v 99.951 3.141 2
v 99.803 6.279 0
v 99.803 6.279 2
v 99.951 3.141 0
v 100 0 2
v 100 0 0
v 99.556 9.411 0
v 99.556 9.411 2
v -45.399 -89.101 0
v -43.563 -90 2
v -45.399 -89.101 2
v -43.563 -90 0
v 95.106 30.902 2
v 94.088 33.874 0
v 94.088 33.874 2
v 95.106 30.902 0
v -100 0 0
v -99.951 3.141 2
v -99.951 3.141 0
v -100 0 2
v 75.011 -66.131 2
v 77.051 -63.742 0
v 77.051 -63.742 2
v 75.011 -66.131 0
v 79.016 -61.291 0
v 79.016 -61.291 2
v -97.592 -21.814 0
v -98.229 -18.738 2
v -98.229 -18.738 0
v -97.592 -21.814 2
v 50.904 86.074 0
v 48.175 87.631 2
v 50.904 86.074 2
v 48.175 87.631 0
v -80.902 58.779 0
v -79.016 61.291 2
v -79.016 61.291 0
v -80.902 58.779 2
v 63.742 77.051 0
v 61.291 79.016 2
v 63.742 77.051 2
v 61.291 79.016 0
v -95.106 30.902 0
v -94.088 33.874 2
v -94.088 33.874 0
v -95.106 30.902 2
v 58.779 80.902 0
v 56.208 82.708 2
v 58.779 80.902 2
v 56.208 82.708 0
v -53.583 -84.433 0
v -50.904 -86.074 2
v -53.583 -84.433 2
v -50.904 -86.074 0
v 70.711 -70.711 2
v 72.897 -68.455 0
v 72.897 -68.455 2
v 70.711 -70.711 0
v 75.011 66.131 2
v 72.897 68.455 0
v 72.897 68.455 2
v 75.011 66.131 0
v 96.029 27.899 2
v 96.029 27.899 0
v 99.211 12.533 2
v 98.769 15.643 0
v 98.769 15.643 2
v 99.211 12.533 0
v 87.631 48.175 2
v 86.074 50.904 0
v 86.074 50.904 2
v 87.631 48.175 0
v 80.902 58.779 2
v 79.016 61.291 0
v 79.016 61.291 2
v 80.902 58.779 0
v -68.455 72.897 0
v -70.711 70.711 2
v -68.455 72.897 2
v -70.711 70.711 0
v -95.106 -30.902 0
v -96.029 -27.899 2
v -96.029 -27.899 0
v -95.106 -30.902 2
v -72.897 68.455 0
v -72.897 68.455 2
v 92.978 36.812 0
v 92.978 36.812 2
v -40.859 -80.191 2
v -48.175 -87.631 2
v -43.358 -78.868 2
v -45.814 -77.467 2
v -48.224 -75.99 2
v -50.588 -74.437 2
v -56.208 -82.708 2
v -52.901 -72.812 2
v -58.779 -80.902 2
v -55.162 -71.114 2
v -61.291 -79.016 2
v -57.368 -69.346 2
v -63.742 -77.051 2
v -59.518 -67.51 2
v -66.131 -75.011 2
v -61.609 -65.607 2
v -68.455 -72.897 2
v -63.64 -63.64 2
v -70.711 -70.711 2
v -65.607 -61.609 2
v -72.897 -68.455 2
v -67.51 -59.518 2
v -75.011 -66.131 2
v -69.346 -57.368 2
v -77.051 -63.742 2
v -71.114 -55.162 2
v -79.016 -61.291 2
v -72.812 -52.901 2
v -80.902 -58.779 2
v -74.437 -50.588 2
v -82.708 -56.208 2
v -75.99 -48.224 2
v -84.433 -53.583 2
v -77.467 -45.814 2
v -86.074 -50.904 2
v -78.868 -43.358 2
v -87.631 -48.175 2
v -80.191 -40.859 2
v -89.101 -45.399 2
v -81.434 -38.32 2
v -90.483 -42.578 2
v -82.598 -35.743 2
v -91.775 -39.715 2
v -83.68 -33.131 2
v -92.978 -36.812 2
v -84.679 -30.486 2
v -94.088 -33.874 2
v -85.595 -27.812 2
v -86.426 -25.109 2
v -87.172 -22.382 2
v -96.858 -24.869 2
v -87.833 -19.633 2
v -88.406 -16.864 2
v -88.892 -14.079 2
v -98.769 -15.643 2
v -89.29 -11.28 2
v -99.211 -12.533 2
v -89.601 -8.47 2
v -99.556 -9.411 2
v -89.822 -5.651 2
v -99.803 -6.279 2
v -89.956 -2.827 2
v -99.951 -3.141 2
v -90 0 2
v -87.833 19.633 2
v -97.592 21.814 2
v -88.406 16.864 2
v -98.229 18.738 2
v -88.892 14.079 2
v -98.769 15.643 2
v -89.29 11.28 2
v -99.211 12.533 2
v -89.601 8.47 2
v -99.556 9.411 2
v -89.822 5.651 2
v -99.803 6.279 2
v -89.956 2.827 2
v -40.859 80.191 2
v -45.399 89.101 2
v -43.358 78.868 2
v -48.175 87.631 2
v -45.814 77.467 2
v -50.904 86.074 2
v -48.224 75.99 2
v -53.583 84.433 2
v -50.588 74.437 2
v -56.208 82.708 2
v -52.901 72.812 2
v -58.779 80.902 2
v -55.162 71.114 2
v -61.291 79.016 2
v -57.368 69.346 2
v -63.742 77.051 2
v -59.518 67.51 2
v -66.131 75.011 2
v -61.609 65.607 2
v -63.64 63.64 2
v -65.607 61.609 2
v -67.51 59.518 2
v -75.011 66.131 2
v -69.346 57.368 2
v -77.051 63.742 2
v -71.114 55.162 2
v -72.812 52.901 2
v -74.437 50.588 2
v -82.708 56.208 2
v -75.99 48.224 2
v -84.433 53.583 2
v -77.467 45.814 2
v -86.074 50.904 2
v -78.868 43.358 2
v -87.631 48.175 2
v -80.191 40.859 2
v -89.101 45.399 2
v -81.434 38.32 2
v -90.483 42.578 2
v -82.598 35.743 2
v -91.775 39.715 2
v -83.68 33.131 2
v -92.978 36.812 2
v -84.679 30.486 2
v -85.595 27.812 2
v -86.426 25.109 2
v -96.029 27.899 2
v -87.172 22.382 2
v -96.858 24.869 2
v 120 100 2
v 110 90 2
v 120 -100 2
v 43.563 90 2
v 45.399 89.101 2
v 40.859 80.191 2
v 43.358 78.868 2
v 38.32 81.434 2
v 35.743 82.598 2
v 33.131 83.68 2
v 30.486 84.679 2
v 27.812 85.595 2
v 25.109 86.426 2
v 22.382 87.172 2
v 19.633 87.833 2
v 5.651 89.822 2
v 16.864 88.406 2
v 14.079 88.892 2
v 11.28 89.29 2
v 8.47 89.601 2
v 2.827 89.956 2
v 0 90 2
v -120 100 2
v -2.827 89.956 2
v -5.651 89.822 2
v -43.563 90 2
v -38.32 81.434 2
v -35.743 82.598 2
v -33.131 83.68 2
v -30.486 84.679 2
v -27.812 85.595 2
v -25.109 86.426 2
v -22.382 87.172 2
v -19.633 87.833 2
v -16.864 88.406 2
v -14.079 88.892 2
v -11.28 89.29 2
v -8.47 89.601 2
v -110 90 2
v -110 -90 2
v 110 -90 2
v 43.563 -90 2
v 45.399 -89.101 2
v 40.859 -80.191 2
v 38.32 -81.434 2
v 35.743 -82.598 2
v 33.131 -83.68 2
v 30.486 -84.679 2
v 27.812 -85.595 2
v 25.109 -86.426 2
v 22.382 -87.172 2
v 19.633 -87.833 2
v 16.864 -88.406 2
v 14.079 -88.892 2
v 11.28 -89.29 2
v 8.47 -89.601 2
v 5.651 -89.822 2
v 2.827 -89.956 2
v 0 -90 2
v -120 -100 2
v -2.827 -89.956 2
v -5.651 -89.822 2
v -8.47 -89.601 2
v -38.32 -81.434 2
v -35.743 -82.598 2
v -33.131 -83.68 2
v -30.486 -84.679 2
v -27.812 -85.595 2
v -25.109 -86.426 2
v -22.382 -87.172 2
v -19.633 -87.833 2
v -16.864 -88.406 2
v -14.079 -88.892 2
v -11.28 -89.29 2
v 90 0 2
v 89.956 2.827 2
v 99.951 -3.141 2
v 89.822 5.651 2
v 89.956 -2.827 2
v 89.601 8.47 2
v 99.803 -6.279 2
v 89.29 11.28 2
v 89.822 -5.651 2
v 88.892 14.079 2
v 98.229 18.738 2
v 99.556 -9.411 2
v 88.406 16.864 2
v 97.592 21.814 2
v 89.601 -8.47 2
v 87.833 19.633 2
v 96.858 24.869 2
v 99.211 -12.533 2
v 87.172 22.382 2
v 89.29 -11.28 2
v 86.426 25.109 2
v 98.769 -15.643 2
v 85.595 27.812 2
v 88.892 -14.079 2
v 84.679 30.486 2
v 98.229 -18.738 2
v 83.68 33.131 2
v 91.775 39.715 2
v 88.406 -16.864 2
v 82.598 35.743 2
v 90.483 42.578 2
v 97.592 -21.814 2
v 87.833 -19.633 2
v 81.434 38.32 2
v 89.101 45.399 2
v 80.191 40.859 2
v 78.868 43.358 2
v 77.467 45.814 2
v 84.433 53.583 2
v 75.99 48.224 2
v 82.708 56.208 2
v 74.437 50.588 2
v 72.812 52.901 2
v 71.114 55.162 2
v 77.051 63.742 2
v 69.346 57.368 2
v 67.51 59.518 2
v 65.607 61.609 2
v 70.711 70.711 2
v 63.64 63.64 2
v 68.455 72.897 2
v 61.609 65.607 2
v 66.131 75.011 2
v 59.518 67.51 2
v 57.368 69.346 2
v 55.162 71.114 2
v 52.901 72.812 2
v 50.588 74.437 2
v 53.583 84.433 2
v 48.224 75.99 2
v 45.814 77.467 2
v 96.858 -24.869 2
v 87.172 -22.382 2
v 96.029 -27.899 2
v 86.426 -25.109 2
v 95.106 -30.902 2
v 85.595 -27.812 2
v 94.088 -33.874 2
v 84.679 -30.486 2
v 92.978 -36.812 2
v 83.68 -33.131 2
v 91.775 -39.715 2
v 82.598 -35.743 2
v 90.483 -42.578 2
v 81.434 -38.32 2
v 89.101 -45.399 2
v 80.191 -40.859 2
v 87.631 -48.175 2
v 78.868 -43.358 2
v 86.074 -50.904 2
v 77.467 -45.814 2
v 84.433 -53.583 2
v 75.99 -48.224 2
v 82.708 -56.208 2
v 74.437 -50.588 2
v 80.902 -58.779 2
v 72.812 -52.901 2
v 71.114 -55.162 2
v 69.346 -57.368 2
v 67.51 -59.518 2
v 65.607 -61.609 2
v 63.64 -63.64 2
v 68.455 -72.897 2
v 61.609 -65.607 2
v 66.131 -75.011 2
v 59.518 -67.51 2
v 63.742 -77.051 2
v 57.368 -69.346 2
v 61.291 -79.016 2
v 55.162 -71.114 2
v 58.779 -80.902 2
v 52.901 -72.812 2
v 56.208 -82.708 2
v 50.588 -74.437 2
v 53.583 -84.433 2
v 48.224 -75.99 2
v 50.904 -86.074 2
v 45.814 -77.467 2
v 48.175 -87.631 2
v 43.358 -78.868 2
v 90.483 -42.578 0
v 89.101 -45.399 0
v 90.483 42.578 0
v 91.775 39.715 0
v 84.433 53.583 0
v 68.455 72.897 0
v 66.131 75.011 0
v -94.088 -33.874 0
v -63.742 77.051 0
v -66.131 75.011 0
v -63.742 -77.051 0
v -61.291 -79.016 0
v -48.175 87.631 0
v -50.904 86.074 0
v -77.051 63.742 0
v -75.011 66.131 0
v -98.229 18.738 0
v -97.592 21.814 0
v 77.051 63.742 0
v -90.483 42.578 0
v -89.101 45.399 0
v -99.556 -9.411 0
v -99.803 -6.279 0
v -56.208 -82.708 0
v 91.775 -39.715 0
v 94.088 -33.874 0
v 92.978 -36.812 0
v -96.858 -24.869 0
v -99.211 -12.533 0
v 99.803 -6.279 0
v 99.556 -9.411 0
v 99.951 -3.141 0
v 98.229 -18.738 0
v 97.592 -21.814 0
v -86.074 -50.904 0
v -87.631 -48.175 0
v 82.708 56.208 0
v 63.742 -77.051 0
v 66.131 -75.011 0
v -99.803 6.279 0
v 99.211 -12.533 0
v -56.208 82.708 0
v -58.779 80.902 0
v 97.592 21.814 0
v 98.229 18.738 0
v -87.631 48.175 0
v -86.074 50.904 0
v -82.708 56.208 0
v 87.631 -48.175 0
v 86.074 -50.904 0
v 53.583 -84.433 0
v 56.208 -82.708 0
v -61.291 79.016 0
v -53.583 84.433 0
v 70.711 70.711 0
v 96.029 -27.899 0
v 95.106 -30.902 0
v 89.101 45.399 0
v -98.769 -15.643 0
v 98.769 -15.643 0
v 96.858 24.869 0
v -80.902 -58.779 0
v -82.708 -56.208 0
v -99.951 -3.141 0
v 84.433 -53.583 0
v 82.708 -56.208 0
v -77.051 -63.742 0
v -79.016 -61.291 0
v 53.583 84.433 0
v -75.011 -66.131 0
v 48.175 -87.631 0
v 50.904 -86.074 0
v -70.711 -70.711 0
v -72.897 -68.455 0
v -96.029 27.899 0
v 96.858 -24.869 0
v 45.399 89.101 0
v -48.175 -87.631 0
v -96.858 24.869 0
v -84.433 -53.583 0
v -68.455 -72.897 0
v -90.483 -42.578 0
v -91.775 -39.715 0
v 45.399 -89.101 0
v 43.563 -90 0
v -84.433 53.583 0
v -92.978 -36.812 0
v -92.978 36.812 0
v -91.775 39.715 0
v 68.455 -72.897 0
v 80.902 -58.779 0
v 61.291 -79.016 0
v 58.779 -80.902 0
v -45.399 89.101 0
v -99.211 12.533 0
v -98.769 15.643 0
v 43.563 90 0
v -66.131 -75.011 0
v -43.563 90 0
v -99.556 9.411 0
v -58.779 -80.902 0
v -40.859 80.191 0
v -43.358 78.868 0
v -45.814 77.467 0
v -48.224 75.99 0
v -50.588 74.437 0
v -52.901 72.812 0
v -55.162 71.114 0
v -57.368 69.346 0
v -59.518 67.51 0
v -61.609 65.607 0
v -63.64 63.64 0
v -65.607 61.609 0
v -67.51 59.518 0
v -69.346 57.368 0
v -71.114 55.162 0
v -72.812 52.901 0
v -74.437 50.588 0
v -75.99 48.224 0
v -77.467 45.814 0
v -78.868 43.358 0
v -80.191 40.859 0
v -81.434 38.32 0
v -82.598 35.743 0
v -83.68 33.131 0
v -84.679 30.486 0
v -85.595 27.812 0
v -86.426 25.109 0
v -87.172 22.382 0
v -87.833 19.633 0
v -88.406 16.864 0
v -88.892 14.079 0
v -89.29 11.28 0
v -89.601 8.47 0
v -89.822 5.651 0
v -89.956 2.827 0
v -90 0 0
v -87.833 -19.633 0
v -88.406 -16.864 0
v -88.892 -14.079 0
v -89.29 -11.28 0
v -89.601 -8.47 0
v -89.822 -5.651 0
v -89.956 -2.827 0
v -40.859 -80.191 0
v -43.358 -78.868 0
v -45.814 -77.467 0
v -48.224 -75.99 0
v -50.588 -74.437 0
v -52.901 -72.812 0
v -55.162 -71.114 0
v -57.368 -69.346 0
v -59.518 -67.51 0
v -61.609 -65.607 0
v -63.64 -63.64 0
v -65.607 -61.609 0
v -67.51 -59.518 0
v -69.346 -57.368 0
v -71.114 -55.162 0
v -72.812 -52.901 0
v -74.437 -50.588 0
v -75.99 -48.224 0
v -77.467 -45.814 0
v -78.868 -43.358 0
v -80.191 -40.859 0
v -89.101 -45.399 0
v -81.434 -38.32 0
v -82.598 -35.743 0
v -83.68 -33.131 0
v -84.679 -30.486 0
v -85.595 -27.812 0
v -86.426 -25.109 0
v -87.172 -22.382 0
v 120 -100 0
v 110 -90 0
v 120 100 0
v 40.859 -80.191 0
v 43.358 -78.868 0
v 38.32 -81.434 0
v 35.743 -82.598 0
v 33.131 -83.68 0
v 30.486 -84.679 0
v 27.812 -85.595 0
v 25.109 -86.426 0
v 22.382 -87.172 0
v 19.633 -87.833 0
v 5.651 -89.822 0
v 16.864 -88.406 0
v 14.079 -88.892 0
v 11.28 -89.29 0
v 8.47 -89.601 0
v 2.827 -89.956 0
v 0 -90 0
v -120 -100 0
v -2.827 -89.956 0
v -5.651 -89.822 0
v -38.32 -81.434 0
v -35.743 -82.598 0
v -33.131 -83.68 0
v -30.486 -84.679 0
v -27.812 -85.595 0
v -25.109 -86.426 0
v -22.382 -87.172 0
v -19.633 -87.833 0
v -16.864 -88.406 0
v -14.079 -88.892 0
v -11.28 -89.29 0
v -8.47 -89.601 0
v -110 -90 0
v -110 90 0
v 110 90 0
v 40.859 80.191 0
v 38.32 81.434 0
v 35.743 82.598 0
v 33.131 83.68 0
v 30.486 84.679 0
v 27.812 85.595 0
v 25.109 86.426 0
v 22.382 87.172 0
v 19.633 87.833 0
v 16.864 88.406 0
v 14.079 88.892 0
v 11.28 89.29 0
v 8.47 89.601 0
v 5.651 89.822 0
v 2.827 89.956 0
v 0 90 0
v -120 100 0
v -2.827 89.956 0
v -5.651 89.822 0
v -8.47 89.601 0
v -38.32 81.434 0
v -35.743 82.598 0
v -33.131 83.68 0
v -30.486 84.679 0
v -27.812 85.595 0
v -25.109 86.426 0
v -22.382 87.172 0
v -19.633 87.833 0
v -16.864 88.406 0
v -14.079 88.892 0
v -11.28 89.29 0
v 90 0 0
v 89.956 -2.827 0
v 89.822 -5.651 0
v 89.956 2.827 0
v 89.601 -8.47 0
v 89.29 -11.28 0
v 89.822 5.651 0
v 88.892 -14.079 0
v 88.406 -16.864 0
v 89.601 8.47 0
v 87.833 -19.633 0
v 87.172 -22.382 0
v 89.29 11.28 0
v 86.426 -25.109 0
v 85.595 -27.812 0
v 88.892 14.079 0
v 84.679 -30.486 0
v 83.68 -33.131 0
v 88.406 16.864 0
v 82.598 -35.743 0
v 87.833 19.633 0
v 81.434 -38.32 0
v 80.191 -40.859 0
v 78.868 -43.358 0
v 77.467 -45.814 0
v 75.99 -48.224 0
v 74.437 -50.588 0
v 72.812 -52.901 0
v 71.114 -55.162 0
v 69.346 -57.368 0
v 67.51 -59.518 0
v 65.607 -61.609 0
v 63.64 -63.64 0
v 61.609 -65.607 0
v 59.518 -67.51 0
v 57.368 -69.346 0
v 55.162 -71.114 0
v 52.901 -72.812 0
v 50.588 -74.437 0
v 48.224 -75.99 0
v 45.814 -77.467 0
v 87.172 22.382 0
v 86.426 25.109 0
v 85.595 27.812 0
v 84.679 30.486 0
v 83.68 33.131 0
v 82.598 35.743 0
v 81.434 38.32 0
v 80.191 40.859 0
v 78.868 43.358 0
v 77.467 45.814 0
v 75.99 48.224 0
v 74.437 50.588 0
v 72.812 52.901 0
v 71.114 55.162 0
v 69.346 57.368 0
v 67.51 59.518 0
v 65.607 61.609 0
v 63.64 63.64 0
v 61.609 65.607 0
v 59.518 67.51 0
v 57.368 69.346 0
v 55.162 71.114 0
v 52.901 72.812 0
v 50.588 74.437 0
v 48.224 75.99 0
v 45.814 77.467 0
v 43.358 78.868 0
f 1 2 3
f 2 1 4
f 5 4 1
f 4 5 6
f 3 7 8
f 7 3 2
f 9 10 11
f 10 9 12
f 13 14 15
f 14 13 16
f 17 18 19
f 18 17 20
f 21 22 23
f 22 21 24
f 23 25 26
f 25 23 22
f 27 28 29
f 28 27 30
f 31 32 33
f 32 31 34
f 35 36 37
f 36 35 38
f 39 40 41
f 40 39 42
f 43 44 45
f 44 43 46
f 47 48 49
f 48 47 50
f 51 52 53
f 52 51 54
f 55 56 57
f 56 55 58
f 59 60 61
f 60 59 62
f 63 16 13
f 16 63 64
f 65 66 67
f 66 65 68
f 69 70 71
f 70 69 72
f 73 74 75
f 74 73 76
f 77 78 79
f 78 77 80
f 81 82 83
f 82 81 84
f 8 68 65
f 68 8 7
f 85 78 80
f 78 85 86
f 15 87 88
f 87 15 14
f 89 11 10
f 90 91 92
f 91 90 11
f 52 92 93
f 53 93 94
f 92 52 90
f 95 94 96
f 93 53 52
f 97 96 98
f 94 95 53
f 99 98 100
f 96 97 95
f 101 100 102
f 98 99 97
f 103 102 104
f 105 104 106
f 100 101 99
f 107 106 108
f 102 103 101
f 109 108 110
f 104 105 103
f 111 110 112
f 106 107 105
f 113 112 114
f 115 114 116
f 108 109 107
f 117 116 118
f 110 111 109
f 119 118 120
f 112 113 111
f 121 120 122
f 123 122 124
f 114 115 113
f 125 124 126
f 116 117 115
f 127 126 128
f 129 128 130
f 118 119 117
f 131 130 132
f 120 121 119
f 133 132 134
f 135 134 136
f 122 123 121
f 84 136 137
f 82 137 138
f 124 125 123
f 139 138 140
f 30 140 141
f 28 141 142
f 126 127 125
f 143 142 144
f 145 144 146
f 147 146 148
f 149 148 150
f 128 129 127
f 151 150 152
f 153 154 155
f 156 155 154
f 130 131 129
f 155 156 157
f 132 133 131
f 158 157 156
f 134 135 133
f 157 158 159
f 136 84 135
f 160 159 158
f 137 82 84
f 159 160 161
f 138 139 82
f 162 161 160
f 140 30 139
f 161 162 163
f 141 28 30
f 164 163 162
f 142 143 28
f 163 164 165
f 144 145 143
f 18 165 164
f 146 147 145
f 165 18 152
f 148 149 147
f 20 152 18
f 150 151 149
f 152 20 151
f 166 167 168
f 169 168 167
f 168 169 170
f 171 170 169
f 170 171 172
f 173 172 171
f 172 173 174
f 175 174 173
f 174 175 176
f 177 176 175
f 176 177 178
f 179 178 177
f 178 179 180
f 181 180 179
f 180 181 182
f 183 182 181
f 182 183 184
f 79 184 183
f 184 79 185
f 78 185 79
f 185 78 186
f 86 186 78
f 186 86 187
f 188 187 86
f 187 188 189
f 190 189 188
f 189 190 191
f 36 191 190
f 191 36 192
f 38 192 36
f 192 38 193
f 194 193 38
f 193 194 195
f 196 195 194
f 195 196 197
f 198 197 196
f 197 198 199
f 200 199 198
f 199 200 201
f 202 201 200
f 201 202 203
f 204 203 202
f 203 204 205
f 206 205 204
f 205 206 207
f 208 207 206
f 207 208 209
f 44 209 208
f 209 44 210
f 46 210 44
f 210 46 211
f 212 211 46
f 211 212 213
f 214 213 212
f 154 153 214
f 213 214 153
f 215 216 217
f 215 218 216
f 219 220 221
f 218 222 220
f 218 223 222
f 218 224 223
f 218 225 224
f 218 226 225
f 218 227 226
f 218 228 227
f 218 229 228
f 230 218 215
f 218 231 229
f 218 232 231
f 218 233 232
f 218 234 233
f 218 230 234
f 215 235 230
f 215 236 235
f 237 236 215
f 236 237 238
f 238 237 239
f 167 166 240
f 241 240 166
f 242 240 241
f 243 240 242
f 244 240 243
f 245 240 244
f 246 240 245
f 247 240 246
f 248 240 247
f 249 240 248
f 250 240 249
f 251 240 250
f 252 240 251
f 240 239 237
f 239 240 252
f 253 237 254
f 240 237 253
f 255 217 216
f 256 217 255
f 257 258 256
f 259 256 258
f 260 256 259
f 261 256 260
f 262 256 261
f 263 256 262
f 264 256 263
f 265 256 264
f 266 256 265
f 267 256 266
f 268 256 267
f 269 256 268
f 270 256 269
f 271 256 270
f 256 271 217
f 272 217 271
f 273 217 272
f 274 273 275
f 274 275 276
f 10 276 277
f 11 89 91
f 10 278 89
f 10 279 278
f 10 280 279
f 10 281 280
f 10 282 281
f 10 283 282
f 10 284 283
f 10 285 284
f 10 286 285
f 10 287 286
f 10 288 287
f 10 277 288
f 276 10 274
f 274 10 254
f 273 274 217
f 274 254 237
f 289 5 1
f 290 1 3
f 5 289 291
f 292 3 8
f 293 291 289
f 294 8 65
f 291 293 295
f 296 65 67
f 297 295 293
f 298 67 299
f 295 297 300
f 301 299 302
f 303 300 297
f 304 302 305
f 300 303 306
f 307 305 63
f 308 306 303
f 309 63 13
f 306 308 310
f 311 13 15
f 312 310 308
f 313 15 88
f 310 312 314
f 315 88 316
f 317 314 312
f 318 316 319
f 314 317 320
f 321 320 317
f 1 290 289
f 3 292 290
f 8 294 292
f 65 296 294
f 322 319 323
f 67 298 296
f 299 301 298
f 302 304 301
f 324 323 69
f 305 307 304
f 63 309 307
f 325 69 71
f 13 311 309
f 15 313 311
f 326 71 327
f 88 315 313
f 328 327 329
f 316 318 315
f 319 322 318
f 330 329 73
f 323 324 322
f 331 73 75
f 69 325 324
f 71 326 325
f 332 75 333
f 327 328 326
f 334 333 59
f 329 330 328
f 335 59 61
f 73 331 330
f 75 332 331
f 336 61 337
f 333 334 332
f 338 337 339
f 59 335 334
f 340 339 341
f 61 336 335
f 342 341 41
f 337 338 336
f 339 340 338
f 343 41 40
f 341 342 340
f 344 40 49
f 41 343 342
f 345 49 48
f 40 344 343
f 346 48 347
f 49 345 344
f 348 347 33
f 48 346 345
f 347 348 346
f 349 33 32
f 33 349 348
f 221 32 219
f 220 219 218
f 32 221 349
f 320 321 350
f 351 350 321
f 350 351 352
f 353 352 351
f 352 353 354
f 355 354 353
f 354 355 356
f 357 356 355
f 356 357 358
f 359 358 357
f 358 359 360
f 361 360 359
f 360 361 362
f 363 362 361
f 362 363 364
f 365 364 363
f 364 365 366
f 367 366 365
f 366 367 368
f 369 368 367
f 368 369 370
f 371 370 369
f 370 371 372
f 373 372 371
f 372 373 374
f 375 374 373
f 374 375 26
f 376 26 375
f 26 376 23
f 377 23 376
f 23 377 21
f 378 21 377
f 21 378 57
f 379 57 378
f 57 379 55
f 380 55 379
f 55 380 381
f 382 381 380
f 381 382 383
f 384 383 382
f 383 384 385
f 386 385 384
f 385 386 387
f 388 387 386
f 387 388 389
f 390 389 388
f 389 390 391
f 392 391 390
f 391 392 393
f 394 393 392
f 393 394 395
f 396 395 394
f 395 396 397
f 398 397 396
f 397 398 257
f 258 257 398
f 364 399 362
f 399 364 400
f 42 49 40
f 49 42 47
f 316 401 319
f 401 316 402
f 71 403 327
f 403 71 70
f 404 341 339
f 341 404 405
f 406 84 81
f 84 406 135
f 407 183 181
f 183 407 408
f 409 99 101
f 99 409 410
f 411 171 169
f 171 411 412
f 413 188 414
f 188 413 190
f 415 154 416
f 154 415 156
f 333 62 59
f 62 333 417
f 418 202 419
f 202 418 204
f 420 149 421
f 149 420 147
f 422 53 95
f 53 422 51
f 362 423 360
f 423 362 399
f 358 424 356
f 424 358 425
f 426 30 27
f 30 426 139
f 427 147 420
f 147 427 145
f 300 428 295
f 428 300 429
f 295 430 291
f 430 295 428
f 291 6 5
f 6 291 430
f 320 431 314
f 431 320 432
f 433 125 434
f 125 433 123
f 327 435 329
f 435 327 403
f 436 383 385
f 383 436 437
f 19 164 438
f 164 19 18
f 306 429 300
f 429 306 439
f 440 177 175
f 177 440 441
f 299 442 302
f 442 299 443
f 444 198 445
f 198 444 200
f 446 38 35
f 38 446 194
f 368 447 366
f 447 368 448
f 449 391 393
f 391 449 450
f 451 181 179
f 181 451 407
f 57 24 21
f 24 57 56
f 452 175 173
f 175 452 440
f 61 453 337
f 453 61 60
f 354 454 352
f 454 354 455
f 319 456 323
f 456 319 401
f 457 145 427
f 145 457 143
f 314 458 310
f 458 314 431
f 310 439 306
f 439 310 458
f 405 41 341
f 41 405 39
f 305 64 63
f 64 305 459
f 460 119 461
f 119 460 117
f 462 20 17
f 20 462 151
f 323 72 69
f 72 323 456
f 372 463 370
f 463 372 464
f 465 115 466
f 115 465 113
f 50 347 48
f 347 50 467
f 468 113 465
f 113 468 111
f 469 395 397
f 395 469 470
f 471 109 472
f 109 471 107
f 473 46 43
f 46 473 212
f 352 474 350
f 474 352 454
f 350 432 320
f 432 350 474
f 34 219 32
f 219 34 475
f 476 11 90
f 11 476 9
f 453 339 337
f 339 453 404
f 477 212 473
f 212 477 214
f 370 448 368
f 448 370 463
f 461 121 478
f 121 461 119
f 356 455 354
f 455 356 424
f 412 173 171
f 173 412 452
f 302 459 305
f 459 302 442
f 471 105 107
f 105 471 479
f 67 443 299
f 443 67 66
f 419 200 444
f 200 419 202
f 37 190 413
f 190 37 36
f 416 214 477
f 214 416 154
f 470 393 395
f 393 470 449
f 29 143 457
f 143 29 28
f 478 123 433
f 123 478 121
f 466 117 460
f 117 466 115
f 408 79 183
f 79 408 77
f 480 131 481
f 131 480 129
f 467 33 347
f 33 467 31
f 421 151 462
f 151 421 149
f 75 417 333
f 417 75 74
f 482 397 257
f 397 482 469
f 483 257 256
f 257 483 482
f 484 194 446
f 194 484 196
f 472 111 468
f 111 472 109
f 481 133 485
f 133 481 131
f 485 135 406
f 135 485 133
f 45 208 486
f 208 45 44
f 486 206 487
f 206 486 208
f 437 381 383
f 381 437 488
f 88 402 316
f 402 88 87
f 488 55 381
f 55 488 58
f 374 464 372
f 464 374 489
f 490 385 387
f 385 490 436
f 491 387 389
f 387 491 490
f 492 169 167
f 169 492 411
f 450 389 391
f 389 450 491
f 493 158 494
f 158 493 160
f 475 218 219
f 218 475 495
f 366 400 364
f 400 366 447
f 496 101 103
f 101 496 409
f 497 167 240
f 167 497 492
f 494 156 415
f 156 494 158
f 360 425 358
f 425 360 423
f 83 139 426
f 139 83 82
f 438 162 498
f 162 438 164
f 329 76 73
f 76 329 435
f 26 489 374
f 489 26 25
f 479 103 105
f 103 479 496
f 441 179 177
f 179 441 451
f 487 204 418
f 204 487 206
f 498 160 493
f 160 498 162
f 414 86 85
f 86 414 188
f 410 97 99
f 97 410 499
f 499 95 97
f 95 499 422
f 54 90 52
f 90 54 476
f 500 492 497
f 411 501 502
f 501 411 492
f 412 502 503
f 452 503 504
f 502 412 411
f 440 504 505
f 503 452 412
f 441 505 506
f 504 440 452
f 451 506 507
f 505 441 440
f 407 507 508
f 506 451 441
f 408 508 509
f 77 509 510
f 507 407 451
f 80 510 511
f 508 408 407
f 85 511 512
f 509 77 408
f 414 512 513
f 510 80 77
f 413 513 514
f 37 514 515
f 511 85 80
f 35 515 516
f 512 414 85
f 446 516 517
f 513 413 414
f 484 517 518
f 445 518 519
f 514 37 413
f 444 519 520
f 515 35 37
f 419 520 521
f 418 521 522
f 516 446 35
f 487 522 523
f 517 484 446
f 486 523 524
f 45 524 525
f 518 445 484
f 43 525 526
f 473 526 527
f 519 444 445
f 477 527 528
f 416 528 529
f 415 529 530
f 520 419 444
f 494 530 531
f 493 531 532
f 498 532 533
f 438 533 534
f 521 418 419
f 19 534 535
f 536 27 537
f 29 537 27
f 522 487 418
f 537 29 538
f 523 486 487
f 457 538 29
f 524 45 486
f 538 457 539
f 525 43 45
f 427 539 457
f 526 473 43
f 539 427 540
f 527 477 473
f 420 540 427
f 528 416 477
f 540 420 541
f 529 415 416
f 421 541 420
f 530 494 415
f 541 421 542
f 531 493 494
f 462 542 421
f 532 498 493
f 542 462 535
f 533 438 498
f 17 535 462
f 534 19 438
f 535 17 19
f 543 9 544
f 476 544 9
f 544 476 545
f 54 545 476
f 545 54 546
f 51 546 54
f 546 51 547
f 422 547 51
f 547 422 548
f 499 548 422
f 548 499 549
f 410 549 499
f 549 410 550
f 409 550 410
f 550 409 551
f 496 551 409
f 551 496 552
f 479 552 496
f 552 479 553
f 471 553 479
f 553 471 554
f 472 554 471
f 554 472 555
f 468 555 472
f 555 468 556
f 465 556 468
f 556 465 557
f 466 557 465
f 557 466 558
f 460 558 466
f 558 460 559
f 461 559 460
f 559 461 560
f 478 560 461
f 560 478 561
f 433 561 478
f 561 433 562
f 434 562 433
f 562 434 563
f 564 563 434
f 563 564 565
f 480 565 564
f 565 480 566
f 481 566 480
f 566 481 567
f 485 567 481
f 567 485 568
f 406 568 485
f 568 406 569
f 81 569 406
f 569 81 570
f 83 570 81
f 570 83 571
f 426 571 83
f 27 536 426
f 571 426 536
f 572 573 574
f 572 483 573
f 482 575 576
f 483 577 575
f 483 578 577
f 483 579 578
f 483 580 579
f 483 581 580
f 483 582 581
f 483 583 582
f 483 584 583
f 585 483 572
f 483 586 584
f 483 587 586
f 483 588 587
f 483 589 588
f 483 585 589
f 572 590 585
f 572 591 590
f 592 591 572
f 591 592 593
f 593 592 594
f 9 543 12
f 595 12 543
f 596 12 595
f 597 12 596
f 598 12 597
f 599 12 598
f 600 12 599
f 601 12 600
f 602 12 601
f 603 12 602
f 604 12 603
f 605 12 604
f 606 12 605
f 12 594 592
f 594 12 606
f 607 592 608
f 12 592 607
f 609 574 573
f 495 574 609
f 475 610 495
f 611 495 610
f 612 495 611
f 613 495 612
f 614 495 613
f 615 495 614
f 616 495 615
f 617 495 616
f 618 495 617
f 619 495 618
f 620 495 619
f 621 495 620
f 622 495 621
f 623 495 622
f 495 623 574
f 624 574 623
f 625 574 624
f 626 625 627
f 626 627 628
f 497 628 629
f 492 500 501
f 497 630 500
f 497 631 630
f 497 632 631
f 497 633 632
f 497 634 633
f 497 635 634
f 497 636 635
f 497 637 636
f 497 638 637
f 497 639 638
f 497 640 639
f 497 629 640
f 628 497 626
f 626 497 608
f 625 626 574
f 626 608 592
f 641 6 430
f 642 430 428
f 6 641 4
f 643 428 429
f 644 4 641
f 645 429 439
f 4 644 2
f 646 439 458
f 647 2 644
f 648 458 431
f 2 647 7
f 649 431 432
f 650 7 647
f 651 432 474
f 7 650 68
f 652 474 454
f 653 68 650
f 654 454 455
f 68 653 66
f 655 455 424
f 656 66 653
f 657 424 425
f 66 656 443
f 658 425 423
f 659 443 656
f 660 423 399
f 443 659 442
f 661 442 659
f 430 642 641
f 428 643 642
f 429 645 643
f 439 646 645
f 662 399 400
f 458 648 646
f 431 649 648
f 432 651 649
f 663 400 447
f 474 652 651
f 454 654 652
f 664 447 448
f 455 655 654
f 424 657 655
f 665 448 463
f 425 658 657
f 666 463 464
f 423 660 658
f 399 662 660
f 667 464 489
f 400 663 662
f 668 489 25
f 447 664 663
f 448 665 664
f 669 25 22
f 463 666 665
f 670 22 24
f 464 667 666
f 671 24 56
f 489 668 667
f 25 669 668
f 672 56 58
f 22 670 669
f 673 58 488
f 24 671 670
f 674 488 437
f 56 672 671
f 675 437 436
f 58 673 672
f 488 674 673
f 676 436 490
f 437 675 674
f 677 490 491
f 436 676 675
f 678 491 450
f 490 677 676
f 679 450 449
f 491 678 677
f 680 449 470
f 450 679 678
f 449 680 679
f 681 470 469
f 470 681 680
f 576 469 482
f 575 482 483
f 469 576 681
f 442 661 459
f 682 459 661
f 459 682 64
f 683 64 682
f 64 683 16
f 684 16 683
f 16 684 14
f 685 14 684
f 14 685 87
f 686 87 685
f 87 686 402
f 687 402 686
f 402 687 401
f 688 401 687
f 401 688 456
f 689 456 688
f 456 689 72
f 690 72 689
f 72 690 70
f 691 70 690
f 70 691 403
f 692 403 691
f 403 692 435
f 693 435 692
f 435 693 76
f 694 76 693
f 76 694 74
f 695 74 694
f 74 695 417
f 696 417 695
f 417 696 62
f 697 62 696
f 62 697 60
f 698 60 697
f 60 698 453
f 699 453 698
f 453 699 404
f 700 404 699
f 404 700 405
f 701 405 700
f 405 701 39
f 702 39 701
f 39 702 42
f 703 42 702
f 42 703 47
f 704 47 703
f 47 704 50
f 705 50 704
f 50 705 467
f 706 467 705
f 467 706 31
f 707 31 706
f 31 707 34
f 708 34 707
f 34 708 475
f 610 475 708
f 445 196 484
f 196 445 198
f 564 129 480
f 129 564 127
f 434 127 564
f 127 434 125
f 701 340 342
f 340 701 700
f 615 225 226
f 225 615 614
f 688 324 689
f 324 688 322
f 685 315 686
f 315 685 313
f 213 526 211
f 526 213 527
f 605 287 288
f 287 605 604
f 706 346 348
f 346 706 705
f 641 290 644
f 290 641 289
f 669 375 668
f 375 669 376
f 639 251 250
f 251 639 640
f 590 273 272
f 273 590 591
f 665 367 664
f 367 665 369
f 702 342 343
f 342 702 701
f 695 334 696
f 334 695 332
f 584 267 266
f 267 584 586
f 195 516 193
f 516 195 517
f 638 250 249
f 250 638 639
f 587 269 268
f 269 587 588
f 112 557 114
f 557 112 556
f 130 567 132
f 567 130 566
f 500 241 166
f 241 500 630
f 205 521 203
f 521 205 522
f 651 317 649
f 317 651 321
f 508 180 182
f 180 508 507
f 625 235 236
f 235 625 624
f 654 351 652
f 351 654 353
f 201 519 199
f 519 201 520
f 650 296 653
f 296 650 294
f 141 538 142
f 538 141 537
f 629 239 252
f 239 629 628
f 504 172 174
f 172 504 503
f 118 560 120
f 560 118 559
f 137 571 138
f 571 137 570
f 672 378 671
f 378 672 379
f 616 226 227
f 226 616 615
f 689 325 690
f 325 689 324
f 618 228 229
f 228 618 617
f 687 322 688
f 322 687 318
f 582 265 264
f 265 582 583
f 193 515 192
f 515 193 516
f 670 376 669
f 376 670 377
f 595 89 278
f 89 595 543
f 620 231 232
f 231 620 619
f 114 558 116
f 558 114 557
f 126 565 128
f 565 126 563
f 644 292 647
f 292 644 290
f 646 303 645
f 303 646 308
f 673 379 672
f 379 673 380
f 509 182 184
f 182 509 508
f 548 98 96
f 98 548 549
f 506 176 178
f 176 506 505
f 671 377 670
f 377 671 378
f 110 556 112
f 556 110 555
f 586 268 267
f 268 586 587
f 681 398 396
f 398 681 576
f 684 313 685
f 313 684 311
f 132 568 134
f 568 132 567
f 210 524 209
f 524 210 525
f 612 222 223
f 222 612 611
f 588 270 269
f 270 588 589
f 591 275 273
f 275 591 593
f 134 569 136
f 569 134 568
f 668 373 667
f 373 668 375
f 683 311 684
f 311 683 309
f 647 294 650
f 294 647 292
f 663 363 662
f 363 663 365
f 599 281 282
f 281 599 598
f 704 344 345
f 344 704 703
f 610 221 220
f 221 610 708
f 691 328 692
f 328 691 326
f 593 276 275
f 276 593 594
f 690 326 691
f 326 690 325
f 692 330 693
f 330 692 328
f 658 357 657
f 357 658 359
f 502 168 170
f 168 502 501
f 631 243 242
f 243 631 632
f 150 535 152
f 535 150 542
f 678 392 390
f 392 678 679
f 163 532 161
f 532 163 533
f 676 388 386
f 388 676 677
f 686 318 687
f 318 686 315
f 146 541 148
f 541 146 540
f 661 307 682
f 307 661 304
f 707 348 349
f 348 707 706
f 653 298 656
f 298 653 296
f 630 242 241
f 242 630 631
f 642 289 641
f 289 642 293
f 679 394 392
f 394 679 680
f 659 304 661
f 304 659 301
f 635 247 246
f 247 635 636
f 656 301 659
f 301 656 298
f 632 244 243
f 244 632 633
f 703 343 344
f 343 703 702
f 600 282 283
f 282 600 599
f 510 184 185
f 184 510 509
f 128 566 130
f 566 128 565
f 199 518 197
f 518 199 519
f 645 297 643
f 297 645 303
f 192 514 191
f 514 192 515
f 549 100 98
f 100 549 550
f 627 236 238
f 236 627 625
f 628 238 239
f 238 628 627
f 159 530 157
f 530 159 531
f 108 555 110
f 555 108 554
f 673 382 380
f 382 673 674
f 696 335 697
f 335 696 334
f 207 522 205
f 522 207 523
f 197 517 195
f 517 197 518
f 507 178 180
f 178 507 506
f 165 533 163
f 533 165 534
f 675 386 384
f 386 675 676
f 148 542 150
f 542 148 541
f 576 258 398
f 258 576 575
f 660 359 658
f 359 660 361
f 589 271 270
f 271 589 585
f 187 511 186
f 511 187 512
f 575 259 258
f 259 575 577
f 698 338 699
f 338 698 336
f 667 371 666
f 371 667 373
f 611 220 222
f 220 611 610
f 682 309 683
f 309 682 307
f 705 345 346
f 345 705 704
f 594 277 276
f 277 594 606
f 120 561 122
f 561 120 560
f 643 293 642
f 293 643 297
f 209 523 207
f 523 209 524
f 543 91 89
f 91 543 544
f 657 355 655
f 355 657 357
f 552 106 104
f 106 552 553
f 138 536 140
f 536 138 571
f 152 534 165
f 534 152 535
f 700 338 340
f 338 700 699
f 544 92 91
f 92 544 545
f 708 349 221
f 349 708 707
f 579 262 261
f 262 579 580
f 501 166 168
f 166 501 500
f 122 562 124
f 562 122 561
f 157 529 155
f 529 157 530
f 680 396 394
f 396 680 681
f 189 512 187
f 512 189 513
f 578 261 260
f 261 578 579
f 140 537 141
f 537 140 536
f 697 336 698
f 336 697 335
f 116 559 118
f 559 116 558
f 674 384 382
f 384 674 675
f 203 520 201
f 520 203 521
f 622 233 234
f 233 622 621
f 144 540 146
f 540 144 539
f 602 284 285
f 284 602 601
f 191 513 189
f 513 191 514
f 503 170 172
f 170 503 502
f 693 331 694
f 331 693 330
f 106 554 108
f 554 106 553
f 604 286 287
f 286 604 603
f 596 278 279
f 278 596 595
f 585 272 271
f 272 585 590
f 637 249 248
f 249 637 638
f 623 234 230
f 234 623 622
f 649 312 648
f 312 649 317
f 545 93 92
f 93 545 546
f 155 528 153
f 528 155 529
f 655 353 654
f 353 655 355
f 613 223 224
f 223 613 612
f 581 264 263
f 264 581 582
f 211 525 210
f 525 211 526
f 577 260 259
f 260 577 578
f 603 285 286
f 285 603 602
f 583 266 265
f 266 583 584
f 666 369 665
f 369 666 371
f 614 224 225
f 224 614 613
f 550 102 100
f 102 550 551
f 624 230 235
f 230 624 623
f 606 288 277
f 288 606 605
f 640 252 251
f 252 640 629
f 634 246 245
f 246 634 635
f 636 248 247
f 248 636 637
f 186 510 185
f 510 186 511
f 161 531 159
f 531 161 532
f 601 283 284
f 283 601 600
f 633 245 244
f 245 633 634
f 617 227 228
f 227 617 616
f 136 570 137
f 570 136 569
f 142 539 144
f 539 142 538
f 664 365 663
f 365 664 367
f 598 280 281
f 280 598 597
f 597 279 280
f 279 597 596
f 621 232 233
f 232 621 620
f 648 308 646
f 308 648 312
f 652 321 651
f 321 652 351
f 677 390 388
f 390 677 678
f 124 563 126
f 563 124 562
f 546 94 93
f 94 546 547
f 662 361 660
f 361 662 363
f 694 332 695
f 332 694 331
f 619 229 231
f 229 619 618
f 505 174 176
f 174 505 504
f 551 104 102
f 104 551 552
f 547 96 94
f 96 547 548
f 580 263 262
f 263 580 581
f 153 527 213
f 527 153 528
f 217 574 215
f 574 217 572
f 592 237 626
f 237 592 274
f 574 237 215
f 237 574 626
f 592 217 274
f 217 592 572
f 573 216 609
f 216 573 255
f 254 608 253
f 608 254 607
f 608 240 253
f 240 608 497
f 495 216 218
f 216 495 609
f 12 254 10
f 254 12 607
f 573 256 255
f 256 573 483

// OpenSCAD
$fn=200;

x=240;
y=200;
b=10;
t=2;

circle();
square();

module circle(){
    difference(){
        cylinder(d=y, h=t);
        
        translate([0,0,-.1])
        cylinder(d=y-b*2, h=t+1);
    }
}

module square(){
    translate([-x/2,-y/2,0])
    difference(){
        cube([x,y,t]);
        
        translate([b,b,-.1])
        cube([x-b*2,y-b*2,t+1]);
    }    
}
